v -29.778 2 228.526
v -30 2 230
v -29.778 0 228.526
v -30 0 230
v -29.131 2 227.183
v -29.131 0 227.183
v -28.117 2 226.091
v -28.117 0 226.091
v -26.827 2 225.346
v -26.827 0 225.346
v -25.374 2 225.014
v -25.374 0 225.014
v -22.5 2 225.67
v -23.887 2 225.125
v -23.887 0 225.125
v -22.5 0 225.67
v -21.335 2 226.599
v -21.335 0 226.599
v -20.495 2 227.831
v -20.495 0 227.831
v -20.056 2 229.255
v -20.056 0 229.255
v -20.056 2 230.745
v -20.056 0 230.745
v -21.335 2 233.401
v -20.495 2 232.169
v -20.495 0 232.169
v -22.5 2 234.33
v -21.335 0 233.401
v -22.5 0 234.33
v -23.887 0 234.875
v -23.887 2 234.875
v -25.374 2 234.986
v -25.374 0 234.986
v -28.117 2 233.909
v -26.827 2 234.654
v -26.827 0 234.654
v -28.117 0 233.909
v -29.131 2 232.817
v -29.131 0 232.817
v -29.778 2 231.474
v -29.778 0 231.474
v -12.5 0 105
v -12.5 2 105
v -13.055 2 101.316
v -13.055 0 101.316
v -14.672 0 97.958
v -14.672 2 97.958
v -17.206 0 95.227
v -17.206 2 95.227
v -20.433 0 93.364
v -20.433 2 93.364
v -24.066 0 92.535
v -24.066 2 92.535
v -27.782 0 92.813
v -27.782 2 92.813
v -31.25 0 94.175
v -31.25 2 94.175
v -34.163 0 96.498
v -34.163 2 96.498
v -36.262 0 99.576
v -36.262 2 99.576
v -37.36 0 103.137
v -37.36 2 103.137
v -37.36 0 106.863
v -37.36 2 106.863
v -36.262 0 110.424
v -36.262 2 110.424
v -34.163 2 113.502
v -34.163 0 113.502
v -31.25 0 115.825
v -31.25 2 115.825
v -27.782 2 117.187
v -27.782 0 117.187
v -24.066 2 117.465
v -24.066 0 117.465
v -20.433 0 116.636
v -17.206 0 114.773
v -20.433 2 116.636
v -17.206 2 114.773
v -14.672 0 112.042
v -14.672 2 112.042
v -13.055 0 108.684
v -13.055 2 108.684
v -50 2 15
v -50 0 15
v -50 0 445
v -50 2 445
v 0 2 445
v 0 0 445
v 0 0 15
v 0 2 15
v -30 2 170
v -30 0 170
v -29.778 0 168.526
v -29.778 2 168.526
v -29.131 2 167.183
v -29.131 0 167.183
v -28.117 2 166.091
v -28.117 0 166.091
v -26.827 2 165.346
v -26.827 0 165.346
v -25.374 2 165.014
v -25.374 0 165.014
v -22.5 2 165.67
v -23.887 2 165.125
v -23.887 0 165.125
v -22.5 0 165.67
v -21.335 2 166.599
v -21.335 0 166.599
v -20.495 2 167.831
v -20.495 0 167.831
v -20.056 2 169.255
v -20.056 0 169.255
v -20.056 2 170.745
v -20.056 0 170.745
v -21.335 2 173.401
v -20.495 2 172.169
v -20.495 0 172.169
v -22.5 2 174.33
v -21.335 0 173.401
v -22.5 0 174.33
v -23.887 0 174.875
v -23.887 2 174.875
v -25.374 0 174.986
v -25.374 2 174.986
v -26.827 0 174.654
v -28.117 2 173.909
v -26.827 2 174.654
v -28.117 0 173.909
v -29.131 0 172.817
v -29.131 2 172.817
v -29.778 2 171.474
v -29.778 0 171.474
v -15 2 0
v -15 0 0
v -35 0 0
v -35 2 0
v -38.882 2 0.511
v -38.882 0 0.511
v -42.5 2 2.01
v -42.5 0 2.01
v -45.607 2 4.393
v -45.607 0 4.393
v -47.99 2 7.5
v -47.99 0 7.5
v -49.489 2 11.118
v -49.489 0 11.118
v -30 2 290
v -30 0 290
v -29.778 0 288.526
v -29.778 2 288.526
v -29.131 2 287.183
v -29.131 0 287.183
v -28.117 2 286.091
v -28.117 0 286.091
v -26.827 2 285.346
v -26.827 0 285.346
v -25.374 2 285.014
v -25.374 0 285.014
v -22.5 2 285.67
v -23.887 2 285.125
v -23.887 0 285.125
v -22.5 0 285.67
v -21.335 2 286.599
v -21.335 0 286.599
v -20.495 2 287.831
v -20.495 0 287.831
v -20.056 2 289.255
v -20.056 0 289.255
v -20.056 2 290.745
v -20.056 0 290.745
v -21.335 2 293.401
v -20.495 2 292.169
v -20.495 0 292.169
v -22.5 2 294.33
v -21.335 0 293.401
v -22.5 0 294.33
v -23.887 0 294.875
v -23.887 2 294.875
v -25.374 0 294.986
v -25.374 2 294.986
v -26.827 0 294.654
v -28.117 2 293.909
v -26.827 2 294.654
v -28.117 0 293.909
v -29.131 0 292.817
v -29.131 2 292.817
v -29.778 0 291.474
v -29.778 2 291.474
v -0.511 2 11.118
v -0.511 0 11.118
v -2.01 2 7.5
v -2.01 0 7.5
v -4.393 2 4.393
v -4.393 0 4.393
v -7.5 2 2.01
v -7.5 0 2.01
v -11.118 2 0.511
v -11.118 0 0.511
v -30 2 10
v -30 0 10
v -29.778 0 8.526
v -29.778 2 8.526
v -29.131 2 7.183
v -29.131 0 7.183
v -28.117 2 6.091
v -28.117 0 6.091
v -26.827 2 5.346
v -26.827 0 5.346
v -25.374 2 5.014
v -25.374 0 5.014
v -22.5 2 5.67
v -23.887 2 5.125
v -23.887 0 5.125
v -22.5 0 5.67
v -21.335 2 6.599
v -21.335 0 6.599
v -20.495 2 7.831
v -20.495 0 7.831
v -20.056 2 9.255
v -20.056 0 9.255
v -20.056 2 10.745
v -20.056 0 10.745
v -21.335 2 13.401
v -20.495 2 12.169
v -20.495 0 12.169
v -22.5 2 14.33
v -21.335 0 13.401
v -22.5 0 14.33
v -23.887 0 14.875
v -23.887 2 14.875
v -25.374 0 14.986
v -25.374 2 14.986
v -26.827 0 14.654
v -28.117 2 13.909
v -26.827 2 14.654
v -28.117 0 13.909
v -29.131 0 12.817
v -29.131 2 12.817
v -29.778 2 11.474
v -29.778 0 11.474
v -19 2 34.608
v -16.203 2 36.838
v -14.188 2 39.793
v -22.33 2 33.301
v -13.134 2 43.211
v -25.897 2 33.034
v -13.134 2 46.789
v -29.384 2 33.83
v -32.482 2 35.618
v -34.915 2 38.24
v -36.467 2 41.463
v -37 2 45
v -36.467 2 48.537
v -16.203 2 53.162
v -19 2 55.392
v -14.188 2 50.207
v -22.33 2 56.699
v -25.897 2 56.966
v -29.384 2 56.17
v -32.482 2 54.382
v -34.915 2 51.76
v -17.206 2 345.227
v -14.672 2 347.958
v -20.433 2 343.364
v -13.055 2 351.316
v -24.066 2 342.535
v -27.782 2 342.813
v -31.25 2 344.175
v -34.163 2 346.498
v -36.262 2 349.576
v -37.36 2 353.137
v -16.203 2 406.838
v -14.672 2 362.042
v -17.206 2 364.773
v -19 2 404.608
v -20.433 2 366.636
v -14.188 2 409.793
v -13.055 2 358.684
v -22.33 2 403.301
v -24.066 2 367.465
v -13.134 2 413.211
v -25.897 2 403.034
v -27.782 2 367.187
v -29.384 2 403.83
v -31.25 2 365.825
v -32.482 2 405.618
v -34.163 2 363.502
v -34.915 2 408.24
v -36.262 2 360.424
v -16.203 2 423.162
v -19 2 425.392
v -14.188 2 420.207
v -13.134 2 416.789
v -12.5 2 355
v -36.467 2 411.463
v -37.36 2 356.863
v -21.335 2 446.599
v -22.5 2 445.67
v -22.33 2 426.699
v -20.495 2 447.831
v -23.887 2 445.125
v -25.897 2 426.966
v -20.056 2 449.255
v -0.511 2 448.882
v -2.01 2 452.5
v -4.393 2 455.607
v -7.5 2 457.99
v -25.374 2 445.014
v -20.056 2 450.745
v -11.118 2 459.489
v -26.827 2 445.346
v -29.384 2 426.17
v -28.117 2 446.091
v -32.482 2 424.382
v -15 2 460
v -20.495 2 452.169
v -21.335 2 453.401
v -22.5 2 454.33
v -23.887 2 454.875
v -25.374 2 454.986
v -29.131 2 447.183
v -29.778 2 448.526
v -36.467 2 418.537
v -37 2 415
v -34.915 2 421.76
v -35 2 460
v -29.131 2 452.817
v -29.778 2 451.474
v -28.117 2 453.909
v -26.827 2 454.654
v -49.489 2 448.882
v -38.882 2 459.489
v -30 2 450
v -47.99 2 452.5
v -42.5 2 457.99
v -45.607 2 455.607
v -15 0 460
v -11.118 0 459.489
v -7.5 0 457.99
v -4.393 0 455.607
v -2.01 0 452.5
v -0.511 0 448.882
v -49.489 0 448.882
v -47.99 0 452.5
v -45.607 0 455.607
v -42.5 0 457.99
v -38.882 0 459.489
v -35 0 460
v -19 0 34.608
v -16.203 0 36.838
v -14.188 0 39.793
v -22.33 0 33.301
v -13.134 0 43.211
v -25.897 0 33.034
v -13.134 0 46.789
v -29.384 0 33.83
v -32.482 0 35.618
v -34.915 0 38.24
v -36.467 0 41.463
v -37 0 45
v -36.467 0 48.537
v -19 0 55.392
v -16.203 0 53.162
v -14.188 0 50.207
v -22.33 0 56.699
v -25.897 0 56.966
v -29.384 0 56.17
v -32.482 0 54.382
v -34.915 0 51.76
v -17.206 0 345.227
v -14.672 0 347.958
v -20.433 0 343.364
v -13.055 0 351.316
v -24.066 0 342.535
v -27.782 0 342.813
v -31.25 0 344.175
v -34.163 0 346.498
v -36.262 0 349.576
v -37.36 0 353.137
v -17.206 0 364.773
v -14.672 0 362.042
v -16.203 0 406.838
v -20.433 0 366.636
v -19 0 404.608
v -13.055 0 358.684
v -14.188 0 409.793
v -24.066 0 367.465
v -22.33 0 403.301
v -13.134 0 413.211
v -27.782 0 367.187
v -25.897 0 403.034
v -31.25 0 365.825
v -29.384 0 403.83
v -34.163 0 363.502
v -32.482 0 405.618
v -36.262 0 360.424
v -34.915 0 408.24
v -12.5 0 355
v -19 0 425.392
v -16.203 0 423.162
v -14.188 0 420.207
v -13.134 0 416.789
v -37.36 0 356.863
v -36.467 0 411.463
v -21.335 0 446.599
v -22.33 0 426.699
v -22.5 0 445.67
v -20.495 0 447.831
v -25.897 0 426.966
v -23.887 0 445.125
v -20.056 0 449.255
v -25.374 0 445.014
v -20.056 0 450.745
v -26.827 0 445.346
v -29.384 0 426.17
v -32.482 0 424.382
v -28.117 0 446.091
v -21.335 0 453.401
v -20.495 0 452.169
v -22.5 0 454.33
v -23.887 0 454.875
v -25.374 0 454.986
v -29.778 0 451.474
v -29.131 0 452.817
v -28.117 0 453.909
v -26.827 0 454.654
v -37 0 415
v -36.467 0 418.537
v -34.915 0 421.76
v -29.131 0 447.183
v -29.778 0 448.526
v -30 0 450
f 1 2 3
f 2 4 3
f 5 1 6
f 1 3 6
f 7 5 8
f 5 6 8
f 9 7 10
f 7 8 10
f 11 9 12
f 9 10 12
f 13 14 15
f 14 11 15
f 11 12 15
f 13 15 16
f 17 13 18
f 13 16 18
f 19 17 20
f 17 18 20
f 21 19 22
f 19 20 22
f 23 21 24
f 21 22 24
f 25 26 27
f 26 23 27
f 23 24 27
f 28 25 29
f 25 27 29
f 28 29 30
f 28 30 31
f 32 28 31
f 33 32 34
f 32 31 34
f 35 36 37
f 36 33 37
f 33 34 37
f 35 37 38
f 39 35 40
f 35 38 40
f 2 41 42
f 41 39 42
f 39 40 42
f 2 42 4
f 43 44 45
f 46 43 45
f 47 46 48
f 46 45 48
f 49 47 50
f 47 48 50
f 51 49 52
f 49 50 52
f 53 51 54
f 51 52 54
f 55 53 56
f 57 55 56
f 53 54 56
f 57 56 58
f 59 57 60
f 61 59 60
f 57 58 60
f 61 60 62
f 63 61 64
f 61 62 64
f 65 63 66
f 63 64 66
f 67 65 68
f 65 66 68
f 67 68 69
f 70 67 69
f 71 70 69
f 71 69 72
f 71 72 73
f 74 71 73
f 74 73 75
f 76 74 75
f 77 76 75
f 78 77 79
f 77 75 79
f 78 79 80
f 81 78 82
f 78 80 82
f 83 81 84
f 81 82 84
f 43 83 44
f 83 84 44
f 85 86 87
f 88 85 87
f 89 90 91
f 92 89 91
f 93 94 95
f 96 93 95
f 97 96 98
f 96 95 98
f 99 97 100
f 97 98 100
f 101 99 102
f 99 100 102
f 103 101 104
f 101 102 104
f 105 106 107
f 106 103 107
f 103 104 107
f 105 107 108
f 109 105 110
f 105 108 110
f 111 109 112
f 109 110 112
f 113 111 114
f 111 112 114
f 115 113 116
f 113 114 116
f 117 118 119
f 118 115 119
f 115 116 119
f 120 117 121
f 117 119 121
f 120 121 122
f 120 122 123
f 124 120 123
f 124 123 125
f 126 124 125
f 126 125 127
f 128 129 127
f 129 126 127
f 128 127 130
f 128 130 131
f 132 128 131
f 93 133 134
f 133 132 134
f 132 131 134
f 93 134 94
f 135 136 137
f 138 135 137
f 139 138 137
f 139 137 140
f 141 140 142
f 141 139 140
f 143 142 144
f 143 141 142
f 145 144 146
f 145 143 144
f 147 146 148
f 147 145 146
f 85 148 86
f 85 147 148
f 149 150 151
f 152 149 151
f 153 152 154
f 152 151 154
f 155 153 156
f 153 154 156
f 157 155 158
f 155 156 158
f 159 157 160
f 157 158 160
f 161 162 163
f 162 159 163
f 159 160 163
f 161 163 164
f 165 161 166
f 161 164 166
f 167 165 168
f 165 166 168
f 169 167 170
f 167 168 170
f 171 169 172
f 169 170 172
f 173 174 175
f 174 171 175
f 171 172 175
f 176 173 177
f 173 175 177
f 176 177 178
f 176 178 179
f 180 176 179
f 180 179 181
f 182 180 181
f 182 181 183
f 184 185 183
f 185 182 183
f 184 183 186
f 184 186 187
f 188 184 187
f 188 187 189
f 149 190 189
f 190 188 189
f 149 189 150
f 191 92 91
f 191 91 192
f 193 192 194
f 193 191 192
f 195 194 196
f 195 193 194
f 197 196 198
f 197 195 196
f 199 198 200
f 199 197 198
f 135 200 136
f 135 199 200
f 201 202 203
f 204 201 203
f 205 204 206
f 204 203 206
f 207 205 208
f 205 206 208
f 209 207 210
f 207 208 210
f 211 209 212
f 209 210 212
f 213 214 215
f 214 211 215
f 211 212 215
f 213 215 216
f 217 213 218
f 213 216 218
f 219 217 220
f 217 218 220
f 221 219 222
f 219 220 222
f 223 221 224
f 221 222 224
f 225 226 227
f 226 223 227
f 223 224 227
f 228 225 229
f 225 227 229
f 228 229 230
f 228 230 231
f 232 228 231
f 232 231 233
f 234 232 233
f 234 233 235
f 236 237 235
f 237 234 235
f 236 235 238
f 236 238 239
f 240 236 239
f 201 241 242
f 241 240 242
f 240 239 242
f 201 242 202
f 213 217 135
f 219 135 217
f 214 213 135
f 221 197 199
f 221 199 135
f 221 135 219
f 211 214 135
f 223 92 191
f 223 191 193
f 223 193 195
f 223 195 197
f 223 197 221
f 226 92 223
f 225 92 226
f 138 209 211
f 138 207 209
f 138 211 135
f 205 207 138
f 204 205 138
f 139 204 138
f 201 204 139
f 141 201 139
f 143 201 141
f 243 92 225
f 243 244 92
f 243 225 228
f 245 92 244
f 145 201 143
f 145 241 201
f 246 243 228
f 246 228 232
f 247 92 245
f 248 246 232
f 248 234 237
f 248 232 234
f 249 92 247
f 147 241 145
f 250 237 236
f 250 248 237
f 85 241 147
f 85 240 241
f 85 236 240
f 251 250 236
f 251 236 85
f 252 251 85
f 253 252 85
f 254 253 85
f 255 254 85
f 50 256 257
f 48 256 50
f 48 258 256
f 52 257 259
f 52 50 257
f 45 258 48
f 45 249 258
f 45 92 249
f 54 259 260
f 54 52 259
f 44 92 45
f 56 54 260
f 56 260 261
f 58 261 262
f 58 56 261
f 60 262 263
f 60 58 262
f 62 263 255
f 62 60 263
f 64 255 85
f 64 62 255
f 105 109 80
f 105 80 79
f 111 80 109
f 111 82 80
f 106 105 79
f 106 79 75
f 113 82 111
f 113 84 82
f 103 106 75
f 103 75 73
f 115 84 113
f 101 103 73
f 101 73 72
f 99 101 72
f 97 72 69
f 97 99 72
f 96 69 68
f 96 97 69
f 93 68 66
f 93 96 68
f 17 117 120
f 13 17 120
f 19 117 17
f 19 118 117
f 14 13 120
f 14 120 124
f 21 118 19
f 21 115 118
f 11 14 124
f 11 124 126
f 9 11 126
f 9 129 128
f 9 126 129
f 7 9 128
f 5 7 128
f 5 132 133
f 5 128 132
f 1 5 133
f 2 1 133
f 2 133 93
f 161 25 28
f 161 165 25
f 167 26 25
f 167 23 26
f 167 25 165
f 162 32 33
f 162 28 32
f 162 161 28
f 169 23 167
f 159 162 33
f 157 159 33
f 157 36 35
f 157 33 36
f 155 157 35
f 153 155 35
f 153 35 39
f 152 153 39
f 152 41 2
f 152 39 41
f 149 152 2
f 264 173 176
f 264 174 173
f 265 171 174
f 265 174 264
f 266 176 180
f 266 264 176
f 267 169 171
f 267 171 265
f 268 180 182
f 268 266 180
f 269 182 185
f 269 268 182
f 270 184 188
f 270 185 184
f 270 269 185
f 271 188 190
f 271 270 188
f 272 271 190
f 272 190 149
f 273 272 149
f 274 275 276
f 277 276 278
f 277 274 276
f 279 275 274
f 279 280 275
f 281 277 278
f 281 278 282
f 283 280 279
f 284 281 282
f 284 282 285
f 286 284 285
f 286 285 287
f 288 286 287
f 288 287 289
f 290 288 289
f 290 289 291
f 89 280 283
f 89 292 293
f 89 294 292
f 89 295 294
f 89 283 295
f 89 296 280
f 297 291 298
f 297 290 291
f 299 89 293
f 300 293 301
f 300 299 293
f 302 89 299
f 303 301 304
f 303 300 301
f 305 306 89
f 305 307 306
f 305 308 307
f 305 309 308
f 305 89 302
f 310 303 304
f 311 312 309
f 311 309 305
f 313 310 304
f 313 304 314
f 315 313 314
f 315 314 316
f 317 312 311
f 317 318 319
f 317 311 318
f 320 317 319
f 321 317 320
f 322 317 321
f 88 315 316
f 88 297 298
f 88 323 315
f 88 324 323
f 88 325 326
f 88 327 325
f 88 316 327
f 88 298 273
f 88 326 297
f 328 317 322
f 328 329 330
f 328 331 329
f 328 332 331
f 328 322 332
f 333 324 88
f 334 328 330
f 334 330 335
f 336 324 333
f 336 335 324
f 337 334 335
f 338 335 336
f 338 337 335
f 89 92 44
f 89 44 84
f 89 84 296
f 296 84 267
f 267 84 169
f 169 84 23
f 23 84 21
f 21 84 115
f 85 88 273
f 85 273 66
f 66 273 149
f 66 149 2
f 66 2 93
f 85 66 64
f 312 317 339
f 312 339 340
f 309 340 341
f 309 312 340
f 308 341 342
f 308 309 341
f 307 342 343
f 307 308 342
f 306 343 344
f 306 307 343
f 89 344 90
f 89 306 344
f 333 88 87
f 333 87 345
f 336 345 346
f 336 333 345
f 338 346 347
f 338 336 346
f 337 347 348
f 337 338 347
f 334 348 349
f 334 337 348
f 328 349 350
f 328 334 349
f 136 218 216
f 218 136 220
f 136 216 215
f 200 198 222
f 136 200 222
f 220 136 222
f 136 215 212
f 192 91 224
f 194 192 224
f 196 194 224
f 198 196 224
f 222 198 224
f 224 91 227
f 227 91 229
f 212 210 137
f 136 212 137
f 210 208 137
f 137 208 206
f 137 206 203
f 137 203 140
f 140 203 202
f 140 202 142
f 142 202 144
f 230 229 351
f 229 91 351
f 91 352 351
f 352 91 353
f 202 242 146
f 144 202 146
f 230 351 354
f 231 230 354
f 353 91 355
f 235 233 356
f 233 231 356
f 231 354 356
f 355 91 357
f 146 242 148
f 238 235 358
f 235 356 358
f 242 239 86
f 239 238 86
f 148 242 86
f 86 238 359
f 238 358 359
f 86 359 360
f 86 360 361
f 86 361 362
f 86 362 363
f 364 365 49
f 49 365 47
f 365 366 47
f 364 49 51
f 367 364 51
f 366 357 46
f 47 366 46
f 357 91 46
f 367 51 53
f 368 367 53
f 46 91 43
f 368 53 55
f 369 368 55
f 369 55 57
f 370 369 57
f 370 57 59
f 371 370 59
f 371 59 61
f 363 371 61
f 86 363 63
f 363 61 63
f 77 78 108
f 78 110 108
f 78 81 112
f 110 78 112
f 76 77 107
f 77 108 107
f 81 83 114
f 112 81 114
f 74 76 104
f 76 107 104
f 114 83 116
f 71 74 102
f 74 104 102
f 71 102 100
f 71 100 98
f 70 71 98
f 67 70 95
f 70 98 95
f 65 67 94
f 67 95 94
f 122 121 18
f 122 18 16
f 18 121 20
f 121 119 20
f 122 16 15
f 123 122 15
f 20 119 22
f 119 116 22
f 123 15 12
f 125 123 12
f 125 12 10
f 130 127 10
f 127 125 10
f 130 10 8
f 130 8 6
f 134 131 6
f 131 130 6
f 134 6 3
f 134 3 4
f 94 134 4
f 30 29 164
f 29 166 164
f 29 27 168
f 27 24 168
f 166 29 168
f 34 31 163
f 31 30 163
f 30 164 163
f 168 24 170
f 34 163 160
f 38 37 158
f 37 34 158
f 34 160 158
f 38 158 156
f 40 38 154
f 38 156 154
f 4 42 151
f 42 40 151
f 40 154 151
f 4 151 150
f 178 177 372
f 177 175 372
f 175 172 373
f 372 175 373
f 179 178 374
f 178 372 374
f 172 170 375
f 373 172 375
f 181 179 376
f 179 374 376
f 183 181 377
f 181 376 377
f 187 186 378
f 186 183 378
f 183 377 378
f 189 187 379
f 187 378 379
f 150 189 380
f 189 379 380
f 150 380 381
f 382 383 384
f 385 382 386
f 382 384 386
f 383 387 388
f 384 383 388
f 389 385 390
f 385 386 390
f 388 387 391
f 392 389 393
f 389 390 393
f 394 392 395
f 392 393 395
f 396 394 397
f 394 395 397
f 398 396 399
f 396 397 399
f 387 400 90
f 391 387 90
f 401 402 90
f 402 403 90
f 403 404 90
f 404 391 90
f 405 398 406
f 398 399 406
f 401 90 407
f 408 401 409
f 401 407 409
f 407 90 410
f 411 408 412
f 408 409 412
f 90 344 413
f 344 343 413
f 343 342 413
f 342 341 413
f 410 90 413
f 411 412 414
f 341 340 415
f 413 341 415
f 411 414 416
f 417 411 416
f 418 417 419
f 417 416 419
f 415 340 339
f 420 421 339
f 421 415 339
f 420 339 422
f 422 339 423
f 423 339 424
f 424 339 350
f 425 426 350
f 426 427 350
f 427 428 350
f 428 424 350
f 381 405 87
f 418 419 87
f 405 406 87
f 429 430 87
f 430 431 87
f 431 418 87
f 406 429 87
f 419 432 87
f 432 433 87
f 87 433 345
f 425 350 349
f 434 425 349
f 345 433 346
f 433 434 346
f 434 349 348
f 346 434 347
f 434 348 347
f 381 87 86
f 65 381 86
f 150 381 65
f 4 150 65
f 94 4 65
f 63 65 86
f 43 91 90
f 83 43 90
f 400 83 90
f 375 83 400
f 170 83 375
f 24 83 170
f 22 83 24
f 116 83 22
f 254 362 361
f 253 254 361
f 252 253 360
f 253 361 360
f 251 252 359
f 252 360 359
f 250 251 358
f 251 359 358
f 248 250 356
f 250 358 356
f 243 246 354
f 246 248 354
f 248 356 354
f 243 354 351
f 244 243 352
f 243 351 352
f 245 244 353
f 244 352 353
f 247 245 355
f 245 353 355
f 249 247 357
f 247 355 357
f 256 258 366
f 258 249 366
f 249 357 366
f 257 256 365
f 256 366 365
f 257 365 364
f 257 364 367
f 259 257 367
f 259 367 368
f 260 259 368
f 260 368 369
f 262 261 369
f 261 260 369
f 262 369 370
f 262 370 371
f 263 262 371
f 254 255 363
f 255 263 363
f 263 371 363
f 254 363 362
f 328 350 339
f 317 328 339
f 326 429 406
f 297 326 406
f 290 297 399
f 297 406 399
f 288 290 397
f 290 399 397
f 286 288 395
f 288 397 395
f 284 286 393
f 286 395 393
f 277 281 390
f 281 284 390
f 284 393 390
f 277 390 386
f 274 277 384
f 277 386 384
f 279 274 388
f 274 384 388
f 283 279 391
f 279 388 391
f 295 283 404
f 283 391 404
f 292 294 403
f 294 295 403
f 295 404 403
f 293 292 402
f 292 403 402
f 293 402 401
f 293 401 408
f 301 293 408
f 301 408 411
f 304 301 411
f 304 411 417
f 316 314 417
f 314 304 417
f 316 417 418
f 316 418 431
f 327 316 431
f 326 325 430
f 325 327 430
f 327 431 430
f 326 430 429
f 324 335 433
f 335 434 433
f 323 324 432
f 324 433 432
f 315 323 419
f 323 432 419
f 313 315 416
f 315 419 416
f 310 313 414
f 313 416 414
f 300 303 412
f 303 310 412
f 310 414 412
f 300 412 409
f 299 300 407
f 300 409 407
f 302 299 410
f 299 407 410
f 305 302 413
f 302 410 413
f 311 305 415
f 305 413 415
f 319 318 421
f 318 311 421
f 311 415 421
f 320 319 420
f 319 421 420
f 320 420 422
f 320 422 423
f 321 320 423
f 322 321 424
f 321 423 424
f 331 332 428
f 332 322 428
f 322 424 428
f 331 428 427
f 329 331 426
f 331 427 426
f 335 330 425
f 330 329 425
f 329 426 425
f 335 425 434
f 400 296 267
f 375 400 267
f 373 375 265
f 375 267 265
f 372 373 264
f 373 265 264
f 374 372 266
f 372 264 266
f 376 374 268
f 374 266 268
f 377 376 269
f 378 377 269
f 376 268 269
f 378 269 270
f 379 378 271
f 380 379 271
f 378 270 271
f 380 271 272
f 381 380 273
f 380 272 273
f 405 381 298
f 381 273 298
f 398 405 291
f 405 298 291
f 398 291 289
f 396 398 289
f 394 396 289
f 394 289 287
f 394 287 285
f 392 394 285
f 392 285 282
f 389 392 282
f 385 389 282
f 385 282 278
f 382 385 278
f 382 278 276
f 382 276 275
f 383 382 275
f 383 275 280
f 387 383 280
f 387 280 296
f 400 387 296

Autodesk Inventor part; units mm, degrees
ref_plane "YZ Plane" through (0, 0, 0) normal (1, 0, 0) x (0, 1, 0)
ref_plane "XZ Plane" through (0, 0, 0) normal (0, 1, 0) x (-1, 0, 0)
ref_plane "XY Plane" through (0, 0, 0) normal (0, 0, 1) x (1, 0, 0)
sketch "Sketch1" plane through (0, 0, 0) normal (0, 1, 0) x (-1, 0, 0)
  line L0 (0, 0) -> (50, 0)
  line L1 (50, 0) -> (50, 460)
  line L2 (50, 460) -> (0, 460)
  line L3 (0, 460) -> (0, 0)
  circle A0 centre (25, 415) radius 12
  circle A1 centre (25, 45) radius 12
  circle A2 centre (25, 450) radius 5
  circle A3 centre (25, 10) radius 5
  line L4 (50, 280) -> (0, 280)
  line L5 (0, 280) -> (0, 180)
  line L6 (0, 180) -> (50, 180)
  line L7 (50, 180) -> (50, 280)
  circle A4 centre (25, 170) radius 5
  circle A5 centre (25, 290) radius 5
  circle A6 centre (25, 230) radius 5
  dimension "d0" = 50
  dimension "d1" = 460
  dimension "d2" = 45
  dimension "d3" = 24
  dimension "d4" = 45
  dimension "d5" = 10
  dimension "d6" = 10
  dimension "d7" = 10
  dimension "d8" = 10
  dimension "d9" = 25
  dimension "d10" = 25
  dimension "d11" = 25
  dimension "d12" = 25
  dimension "d15" = 50
  dimension "d16" = 100
  dimension "d17" = 180
  dimension "d18" = 10
  dimension "d20" = 10
  dimension "d21" = 10
  dimension "d22" = 25
  dimension "d23" = 25
  dimension "d24" = 10
  dimension "d27" = 10
  dimension "d28" = 25
  dimension "d29" = 50
extrude "Plate3" add sketch "Sketch1" along normal blind 2
fillet "Fillet3" radius 15 4 edges at (0, 1, 460) (-50, 1, 460) (0, 1, 0) (-50, 1, 0)
sketch "Sketch3" plane through (0, 2, 0) normal (0, 1, 0) x (1, 0, 0)
  circle A0 centre (-25, -105) radius 12.5
  circle A1 centre (-25, -45) radius 12 projected
  circle A2 centre (-25, -355) radius 12.5
  circle A3 centre (-25, -415) radius 12 projected
  point P0 (0, 0)
  dimension "d36" = 25
  dimension "d37" = 60
  dimension "d38" = 25
  dimension "d42" = 60
extrude "Extrusion1" cut sketch "Sketch3" against normal blind 10 contours A0 | A2
equation "\"d30\" = Thickness"
equation "\"BendRadius\" = Thickness"
equation "\"BendReliefWidth\" = Thickness"
equation "\"BendReliefDepth\" = 0.5 * Thickness"
equation "\"CornerReliefSize\" = 4 * Thickness"
equation "\"MinimumRemnant\" = 2 * Thickness"
equation "\"TransitionRadius\" = BendRadius"
equation "\"JacobiRadiusSize\" = BendRadius"
equation "\"GapSize\" = Thickness"
equation "\"Thickness\" = 2"
properties part number "chassisPart1"
